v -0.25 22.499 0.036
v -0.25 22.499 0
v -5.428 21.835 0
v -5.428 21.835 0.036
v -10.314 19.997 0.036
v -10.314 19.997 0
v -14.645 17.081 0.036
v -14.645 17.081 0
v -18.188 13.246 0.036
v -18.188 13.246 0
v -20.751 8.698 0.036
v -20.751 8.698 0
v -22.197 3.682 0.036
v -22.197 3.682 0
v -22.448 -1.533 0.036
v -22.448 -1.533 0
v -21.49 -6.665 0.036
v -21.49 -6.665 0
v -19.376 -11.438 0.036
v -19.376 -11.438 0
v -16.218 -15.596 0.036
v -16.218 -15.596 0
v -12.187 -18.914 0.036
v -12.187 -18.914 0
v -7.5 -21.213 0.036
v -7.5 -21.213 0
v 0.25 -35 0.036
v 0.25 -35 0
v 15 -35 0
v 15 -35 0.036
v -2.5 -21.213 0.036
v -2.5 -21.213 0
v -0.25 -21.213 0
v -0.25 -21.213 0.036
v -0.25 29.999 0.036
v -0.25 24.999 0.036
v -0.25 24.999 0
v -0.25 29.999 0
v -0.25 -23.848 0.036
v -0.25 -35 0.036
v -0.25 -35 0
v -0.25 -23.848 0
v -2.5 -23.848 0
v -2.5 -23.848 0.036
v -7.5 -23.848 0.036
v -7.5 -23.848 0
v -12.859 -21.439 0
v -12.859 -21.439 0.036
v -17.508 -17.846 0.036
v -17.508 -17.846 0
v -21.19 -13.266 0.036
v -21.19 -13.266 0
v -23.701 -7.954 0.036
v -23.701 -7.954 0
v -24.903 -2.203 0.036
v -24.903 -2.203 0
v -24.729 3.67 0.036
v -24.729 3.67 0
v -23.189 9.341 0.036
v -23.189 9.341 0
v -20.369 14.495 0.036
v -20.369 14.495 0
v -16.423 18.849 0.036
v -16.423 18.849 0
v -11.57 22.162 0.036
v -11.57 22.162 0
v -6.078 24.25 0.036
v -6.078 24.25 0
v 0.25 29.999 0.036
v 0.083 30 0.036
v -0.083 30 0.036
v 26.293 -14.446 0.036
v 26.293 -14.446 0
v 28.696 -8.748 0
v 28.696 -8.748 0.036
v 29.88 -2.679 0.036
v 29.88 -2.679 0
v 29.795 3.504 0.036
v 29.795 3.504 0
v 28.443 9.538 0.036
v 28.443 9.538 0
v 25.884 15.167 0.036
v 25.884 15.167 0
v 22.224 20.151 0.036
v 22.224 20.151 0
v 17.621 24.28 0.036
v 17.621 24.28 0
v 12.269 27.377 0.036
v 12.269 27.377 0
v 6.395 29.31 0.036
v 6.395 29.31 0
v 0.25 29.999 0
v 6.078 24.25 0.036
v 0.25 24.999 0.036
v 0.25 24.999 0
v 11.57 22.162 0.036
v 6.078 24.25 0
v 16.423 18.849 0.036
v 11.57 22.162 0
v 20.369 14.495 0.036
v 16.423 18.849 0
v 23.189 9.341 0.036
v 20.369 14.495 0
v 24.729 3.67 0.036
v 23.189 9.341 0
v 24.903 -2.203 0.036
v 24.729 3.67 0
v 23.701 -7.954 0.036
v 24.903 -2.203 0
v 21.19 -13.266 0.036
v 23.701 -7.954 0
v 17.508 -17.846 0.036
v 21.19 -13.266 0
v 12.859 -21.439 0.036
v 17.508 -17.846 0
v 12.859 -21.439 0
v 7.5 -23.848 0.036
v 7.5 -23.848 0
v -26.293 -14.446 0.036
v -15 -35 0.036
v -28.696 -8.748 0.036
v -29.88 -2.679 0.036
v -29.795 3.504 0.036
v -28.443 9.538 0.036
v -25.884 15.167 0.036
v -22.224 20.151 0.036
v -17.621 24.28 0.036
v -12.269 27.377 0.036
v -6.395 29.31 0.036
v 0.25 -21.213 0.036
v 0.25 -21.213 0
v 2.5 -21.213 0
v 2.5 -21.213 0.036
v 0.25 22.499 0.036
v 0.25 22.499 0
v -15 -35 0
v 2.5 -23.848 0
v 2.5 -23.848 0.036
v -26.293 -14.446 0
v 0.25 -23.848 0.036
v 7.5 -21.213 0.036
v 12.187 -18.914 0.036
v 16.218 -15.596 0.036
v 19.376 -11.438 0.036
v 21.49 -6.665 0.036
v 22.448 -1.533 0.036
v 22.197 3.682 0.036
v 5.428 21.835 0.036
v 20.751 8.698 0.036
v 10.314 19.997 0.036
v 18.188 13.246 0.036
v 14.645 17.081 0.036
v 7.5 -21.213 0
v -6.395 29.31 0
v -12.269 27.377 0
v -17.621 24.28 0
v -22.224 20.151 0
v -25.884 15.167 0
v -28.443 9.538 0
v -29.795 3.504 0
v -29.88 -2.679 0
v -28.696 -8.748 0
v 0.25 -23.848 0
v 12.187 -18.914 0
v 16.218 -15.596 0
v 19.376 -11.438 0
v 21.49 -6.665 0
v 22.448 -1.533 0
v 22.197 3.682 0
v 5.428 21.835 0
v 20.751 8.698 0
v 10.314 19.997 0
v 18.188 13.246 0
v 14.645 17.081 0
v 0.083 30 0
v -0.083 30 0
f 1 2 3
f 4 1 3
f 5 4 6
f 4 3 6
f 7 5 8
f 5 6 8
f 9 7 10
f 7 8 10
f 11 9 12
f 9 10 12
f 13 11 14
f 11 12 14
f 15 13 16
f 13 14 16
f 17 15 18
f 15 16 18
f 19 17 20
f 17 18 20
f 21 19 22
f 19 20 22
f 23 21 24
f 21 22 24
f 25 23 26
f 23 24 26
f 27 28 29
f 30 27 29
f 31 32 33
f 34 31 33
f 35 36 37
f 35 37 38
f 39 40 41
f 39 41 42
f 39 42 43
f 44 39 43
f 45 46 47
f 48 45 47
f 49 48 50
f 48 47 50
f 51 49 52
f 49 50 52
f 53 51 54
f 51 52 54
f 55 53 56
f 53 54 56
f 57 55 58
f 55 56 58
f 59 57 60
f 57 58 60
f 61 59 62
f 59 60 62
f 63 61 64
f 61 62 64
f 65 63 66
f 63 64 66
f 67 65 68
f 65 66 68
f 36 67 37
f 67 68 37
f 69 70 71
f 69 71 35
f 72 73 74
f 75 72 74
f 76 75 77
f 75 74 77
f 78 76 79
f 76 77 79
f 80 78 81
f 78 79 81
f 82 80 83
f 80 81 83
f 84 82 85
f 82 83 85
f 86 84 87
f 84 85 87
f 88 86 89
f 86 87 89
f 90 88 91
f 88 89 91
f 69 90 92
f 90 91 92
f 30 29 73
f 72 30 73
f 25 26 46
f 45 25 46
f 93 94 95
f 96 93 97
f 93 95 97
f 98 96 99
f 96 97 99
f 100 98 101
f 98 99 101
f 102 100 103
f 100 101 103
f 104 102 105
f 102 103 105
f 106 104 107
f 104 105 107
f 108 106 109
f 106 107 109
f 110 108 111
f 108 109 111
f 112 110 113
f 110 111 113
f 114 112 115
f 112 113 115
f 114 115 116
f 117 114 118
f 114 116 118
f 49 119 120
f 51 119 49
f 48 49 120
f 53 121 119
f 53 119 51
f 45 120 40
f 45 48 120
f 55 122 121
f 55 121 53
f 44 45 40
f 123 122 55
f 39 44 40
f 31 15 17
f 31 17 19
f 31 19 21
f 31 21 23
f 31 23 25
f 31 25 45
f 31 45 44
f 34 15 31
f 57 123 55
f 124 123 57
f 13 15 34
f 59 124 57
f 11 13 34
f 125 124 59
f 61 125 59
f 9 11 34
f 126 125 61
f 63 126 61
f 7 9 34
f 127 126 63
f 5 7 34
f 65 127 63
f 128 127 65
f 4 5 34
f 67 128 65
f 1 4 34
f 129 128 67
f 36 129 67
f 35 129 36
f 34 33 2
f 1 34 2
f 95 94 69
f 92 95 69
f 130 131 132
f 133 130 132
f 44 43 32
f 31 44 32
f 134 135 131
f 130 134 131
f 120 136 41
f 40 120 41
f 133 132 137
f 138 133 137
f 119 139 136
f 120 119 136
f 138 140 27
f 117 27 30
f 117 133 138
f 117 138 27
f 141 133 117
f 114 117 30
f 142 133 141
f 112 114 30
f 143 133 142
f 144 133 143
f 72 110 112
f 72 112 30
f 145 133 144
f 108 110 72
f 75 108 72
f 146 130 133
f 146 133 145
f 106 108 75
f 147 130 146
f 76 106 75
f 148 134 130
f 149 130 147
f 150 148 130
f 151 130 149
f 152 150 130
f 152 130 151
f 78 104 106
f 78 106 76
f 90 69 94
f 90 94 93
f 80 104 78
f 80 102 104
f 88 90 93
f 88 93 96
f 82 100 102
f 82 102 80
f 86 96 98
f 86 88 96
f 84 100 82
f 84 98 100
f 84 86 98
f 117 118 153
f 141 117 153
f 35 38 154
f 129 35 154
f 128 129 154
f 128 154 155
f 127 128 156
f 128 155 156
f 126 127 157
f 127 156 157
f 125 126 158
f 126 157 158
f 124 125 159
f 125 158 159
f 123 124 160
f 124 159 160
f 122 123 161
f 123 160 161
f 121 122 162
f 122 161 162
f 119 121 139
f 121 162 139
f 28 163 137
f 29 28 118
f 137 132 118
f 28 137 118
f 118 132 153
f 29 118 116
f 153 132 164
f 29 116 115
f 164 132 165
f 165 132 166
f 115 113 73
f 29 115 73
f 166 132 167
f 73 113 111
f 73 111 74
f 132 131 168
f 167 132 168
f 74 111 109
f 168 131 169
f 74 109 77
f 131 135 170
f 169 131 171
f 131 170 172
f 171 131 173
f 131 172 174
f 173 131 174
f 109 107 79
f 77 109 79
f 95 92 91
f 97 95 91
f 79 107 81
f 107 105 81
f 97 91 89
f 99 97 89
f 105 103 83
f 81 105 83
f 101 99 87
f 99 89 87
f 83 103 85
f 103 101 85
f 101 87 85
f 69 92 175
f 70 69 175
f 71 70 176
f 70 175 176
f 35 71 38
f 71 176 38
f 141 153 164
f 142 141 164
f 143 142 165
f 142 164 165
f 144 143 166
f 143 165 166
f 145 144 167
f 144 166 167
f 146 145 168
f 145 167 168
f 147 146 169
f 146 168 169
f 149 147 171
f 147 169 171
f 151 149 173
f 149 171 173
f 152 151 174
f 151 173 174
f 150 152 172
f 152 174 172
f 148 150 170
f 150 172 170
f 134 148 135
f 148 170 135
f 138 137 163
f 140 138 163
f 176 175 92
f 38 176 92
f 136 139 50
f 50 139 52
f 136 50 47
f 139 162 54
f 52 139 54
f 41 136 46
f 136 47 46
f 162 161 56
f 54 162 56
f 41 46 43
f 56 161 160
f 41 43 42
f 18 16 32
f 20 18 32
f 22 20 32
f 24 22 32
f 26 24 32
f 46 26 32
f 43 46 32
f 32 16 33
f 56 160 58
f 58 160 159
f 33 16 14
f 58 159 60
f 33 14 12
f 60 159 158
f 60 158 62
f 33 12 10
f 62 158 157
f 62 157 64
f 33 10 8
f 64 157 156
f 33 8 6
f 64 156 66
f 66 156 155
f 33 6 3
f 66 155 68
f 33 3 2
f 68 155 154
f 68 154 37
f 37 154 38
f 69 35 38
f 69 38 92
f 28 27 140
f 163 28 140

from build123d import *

# Parameters (mm, degrees)
BOSS_EXTRUDE1_DEPTH = 0.03556
SKETCH3_W           = 0.5
SKETCH3_H           = 7.500347247
SKETCH3_H_2         = 13.786796599
CUT_EXTRUDE2_DEPTH  = 1


with BuildPart() as part:
    # Sketch2 → Boss-Extrude1 (new body)
    with BuildSketch(Plane.XY):
        with BuildLine():
            Line((-7.5, -35.000000035), (0, -35.000000035))
            Line((0, -35.000000035), (7.5, -35.000000035))
            Line((7.5, -35.000000035), (15, -35.000000035))
            Line((15, -35.000000035), (26.292884658, -14.44590656))
            ThreePointArc((26.292884658, -14.44590656), (0, 30), (-26.292884658, -14.44590656))
            Line((-26.292884658, -14.44590656), (-15, -35.000000035))
            Line((-15, -35.000000035), (-7.5, -35.000000035))
        make_face()
        with BuildLine():
            Line((0.25, 22.498611068), (0.25, -21.213203436))
            Line((0.25, -21.213203436), (2.5, -21.213203436))
            Line((2.5, -21.213203436), (2.5, -23.848480036))
            Line((2.5, -23.848480036), (-2.5, -23.848480036))
            Line((-2.5, -23.848480036), (-2.5, -21.213203436))
            Line((-2.5, -21.213203436), (-0.25, -21.213203436))
            Line((-0.25, -21.213203436), (-0.25, 22.498611068))
            ThreePointArc((-0.25, 22.498611068), (-22.196763431, 3.681534082), (-7.5, -21.213203436))
            Line((-7.5, -21.213203436), (-7.5, -23.848480035))
            ThreePointArc((-7.5, -23.848480035), (0, 25), (7.5, -23.848480035))
            Line((7.5, -23.848480035), (7.5, -21.213203436))
            ThreePointArc((7.5, -21.213203436), (22.196763431, 3.681534082), (0.25, 22.498611068))
        make_face(mode=Mode.SUBTRACT)
    extrude(amount=BOSS_EXTRUDE1_DEPTH)

    # Sketch3 → Cut-Extrude2 (cut)
    with BuildSketch(Plane.XY.offset(0.03556)):
        with Locations((0, 26.248784692)):
            Rectangle(SKETCH3_W, SKETCH3_H)
        with Locations((0, -28.106601735)):
            Rectangle(SKETCH3_W, SKETCH3_H_2)
    extrude(amount=-CUT_EXTRUDE2_DEPTH, mode=Mode.SUBTRACT)


solid = part.part
